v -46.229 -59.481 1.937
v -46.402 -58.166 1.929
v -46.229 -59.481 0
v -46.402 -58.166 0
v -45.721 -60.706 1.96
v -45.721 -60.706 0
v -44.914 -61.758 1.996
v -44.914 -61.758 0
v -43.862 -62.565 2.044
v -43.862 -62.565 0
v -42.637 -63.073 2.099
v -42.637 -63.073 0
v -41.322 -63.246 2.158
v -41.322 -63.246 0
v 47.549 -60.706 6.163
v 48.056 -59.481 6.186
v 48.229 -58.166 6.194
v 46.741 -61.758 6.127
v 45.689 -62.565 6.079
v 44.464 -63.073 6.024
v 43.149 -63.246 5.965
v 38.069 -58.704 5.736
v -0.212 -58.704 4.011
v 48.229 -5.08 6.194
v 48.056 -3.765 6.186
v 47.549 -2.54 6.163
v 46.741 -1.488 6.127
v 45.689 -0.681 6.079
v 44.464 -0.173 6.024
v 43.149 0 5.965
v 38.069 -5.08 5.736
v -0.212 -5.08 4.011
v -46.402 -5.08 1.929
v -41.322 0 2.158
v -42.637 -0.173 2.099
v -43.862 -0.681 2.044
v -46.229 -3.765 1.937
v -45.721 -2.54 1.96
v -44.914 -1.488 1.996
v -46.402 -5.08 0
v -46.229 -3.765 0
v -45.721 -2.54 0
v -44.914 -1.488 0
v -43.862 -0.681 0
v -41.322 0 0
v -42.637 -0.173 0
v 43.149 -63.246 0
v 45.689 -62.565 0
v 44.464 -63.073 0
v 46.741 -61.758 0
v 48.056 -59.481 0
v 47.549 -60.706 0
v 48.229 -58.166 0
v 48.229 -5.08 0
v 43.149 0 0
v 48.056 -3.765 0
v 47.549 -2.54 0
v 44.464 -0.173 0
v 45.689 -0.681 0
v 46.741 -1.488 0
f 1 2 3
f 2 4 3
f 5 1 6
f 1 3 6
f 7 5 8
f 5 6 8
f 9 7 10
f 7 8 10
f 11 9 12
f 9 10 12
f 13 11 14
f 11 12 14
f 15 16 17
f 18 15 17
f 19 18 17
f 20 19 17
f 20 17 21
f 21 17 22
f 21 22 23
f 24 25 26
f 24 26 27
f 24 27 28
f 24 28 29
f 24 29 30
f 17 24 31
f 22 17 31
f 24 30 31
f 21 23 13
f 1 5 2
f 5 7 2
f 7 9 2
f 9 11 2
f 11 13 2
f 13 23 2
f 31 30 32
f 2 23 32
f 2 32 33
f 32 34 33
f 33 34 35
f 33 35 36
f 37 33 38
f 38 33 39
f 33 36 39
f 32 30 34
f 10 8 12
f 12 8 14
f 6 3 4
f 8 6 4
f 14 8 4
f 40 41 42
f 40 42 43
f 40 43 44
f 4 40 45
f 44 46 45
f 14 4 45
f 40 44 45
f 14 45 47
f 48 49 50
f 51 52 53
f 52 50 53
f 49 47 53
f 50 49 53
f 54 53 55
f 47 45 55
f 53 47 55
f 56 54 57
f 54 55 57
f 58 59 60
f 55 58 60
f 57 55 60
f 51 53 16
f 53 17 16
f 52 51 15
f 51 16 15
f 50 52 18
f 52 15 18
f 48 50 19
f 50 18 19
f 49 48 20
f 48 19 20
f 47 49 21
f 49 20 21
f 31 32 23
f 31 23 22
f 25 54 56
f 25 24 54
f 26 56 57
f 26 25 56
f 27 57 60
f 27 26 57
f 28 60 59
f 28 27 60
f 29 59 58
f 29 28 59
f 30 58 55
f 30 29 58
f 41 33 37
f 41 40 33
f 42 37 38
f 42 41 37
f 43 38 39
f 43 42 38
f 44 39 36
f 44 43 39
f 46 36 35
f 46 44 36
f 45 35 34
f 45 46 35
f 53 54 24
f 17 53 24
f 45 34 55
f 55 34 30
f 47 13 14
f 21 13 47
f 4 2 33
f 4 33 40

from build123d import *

# Parameters (mm, degrees)
F1_DEPTH = 63.246
F2_R     = 5.08
F3_W     = 42.474462
F3_H     = 53.623985
F4_DEPTH = 1.27


with BuildPart() as f1:
    # F0 (on Front) → F1 (new body)
    with BuildSketch(Plane.XZ):
        Polygon((-46.401739, 1.929175), (-46.401739, 0), (48.229381, 0), (48.229381, 6.193668), align=None)
    extrude(amount=F1_DEPTH)

    # F2
    f2_edges = [f1.edges().sort_by_distance(p)[0] for p in [
        (48.229381, 0, 3.096834),
        (48.229381, -63.246, 3.096834),
        (-46.401739, -63.246, 0.964588),
        (-46.401739, 0, 0.964588),
    ]]
    fillet(f2_edges, radius=F2_R)

    # F3 (on face) → F4 (join)
    with BuildSketch(Plane(origin=(-0.180802, 0, 4.012093), x_dir=(0.998986, 0, 0.045019), z_dir=(-0.045019, 0, 0.998986))):
        with Locations((17.051772, -31.891992)):
            Rectangle(F3_W, F3_H)
    extrude(amount=-F4_DEPTH)


solid = f1.part
